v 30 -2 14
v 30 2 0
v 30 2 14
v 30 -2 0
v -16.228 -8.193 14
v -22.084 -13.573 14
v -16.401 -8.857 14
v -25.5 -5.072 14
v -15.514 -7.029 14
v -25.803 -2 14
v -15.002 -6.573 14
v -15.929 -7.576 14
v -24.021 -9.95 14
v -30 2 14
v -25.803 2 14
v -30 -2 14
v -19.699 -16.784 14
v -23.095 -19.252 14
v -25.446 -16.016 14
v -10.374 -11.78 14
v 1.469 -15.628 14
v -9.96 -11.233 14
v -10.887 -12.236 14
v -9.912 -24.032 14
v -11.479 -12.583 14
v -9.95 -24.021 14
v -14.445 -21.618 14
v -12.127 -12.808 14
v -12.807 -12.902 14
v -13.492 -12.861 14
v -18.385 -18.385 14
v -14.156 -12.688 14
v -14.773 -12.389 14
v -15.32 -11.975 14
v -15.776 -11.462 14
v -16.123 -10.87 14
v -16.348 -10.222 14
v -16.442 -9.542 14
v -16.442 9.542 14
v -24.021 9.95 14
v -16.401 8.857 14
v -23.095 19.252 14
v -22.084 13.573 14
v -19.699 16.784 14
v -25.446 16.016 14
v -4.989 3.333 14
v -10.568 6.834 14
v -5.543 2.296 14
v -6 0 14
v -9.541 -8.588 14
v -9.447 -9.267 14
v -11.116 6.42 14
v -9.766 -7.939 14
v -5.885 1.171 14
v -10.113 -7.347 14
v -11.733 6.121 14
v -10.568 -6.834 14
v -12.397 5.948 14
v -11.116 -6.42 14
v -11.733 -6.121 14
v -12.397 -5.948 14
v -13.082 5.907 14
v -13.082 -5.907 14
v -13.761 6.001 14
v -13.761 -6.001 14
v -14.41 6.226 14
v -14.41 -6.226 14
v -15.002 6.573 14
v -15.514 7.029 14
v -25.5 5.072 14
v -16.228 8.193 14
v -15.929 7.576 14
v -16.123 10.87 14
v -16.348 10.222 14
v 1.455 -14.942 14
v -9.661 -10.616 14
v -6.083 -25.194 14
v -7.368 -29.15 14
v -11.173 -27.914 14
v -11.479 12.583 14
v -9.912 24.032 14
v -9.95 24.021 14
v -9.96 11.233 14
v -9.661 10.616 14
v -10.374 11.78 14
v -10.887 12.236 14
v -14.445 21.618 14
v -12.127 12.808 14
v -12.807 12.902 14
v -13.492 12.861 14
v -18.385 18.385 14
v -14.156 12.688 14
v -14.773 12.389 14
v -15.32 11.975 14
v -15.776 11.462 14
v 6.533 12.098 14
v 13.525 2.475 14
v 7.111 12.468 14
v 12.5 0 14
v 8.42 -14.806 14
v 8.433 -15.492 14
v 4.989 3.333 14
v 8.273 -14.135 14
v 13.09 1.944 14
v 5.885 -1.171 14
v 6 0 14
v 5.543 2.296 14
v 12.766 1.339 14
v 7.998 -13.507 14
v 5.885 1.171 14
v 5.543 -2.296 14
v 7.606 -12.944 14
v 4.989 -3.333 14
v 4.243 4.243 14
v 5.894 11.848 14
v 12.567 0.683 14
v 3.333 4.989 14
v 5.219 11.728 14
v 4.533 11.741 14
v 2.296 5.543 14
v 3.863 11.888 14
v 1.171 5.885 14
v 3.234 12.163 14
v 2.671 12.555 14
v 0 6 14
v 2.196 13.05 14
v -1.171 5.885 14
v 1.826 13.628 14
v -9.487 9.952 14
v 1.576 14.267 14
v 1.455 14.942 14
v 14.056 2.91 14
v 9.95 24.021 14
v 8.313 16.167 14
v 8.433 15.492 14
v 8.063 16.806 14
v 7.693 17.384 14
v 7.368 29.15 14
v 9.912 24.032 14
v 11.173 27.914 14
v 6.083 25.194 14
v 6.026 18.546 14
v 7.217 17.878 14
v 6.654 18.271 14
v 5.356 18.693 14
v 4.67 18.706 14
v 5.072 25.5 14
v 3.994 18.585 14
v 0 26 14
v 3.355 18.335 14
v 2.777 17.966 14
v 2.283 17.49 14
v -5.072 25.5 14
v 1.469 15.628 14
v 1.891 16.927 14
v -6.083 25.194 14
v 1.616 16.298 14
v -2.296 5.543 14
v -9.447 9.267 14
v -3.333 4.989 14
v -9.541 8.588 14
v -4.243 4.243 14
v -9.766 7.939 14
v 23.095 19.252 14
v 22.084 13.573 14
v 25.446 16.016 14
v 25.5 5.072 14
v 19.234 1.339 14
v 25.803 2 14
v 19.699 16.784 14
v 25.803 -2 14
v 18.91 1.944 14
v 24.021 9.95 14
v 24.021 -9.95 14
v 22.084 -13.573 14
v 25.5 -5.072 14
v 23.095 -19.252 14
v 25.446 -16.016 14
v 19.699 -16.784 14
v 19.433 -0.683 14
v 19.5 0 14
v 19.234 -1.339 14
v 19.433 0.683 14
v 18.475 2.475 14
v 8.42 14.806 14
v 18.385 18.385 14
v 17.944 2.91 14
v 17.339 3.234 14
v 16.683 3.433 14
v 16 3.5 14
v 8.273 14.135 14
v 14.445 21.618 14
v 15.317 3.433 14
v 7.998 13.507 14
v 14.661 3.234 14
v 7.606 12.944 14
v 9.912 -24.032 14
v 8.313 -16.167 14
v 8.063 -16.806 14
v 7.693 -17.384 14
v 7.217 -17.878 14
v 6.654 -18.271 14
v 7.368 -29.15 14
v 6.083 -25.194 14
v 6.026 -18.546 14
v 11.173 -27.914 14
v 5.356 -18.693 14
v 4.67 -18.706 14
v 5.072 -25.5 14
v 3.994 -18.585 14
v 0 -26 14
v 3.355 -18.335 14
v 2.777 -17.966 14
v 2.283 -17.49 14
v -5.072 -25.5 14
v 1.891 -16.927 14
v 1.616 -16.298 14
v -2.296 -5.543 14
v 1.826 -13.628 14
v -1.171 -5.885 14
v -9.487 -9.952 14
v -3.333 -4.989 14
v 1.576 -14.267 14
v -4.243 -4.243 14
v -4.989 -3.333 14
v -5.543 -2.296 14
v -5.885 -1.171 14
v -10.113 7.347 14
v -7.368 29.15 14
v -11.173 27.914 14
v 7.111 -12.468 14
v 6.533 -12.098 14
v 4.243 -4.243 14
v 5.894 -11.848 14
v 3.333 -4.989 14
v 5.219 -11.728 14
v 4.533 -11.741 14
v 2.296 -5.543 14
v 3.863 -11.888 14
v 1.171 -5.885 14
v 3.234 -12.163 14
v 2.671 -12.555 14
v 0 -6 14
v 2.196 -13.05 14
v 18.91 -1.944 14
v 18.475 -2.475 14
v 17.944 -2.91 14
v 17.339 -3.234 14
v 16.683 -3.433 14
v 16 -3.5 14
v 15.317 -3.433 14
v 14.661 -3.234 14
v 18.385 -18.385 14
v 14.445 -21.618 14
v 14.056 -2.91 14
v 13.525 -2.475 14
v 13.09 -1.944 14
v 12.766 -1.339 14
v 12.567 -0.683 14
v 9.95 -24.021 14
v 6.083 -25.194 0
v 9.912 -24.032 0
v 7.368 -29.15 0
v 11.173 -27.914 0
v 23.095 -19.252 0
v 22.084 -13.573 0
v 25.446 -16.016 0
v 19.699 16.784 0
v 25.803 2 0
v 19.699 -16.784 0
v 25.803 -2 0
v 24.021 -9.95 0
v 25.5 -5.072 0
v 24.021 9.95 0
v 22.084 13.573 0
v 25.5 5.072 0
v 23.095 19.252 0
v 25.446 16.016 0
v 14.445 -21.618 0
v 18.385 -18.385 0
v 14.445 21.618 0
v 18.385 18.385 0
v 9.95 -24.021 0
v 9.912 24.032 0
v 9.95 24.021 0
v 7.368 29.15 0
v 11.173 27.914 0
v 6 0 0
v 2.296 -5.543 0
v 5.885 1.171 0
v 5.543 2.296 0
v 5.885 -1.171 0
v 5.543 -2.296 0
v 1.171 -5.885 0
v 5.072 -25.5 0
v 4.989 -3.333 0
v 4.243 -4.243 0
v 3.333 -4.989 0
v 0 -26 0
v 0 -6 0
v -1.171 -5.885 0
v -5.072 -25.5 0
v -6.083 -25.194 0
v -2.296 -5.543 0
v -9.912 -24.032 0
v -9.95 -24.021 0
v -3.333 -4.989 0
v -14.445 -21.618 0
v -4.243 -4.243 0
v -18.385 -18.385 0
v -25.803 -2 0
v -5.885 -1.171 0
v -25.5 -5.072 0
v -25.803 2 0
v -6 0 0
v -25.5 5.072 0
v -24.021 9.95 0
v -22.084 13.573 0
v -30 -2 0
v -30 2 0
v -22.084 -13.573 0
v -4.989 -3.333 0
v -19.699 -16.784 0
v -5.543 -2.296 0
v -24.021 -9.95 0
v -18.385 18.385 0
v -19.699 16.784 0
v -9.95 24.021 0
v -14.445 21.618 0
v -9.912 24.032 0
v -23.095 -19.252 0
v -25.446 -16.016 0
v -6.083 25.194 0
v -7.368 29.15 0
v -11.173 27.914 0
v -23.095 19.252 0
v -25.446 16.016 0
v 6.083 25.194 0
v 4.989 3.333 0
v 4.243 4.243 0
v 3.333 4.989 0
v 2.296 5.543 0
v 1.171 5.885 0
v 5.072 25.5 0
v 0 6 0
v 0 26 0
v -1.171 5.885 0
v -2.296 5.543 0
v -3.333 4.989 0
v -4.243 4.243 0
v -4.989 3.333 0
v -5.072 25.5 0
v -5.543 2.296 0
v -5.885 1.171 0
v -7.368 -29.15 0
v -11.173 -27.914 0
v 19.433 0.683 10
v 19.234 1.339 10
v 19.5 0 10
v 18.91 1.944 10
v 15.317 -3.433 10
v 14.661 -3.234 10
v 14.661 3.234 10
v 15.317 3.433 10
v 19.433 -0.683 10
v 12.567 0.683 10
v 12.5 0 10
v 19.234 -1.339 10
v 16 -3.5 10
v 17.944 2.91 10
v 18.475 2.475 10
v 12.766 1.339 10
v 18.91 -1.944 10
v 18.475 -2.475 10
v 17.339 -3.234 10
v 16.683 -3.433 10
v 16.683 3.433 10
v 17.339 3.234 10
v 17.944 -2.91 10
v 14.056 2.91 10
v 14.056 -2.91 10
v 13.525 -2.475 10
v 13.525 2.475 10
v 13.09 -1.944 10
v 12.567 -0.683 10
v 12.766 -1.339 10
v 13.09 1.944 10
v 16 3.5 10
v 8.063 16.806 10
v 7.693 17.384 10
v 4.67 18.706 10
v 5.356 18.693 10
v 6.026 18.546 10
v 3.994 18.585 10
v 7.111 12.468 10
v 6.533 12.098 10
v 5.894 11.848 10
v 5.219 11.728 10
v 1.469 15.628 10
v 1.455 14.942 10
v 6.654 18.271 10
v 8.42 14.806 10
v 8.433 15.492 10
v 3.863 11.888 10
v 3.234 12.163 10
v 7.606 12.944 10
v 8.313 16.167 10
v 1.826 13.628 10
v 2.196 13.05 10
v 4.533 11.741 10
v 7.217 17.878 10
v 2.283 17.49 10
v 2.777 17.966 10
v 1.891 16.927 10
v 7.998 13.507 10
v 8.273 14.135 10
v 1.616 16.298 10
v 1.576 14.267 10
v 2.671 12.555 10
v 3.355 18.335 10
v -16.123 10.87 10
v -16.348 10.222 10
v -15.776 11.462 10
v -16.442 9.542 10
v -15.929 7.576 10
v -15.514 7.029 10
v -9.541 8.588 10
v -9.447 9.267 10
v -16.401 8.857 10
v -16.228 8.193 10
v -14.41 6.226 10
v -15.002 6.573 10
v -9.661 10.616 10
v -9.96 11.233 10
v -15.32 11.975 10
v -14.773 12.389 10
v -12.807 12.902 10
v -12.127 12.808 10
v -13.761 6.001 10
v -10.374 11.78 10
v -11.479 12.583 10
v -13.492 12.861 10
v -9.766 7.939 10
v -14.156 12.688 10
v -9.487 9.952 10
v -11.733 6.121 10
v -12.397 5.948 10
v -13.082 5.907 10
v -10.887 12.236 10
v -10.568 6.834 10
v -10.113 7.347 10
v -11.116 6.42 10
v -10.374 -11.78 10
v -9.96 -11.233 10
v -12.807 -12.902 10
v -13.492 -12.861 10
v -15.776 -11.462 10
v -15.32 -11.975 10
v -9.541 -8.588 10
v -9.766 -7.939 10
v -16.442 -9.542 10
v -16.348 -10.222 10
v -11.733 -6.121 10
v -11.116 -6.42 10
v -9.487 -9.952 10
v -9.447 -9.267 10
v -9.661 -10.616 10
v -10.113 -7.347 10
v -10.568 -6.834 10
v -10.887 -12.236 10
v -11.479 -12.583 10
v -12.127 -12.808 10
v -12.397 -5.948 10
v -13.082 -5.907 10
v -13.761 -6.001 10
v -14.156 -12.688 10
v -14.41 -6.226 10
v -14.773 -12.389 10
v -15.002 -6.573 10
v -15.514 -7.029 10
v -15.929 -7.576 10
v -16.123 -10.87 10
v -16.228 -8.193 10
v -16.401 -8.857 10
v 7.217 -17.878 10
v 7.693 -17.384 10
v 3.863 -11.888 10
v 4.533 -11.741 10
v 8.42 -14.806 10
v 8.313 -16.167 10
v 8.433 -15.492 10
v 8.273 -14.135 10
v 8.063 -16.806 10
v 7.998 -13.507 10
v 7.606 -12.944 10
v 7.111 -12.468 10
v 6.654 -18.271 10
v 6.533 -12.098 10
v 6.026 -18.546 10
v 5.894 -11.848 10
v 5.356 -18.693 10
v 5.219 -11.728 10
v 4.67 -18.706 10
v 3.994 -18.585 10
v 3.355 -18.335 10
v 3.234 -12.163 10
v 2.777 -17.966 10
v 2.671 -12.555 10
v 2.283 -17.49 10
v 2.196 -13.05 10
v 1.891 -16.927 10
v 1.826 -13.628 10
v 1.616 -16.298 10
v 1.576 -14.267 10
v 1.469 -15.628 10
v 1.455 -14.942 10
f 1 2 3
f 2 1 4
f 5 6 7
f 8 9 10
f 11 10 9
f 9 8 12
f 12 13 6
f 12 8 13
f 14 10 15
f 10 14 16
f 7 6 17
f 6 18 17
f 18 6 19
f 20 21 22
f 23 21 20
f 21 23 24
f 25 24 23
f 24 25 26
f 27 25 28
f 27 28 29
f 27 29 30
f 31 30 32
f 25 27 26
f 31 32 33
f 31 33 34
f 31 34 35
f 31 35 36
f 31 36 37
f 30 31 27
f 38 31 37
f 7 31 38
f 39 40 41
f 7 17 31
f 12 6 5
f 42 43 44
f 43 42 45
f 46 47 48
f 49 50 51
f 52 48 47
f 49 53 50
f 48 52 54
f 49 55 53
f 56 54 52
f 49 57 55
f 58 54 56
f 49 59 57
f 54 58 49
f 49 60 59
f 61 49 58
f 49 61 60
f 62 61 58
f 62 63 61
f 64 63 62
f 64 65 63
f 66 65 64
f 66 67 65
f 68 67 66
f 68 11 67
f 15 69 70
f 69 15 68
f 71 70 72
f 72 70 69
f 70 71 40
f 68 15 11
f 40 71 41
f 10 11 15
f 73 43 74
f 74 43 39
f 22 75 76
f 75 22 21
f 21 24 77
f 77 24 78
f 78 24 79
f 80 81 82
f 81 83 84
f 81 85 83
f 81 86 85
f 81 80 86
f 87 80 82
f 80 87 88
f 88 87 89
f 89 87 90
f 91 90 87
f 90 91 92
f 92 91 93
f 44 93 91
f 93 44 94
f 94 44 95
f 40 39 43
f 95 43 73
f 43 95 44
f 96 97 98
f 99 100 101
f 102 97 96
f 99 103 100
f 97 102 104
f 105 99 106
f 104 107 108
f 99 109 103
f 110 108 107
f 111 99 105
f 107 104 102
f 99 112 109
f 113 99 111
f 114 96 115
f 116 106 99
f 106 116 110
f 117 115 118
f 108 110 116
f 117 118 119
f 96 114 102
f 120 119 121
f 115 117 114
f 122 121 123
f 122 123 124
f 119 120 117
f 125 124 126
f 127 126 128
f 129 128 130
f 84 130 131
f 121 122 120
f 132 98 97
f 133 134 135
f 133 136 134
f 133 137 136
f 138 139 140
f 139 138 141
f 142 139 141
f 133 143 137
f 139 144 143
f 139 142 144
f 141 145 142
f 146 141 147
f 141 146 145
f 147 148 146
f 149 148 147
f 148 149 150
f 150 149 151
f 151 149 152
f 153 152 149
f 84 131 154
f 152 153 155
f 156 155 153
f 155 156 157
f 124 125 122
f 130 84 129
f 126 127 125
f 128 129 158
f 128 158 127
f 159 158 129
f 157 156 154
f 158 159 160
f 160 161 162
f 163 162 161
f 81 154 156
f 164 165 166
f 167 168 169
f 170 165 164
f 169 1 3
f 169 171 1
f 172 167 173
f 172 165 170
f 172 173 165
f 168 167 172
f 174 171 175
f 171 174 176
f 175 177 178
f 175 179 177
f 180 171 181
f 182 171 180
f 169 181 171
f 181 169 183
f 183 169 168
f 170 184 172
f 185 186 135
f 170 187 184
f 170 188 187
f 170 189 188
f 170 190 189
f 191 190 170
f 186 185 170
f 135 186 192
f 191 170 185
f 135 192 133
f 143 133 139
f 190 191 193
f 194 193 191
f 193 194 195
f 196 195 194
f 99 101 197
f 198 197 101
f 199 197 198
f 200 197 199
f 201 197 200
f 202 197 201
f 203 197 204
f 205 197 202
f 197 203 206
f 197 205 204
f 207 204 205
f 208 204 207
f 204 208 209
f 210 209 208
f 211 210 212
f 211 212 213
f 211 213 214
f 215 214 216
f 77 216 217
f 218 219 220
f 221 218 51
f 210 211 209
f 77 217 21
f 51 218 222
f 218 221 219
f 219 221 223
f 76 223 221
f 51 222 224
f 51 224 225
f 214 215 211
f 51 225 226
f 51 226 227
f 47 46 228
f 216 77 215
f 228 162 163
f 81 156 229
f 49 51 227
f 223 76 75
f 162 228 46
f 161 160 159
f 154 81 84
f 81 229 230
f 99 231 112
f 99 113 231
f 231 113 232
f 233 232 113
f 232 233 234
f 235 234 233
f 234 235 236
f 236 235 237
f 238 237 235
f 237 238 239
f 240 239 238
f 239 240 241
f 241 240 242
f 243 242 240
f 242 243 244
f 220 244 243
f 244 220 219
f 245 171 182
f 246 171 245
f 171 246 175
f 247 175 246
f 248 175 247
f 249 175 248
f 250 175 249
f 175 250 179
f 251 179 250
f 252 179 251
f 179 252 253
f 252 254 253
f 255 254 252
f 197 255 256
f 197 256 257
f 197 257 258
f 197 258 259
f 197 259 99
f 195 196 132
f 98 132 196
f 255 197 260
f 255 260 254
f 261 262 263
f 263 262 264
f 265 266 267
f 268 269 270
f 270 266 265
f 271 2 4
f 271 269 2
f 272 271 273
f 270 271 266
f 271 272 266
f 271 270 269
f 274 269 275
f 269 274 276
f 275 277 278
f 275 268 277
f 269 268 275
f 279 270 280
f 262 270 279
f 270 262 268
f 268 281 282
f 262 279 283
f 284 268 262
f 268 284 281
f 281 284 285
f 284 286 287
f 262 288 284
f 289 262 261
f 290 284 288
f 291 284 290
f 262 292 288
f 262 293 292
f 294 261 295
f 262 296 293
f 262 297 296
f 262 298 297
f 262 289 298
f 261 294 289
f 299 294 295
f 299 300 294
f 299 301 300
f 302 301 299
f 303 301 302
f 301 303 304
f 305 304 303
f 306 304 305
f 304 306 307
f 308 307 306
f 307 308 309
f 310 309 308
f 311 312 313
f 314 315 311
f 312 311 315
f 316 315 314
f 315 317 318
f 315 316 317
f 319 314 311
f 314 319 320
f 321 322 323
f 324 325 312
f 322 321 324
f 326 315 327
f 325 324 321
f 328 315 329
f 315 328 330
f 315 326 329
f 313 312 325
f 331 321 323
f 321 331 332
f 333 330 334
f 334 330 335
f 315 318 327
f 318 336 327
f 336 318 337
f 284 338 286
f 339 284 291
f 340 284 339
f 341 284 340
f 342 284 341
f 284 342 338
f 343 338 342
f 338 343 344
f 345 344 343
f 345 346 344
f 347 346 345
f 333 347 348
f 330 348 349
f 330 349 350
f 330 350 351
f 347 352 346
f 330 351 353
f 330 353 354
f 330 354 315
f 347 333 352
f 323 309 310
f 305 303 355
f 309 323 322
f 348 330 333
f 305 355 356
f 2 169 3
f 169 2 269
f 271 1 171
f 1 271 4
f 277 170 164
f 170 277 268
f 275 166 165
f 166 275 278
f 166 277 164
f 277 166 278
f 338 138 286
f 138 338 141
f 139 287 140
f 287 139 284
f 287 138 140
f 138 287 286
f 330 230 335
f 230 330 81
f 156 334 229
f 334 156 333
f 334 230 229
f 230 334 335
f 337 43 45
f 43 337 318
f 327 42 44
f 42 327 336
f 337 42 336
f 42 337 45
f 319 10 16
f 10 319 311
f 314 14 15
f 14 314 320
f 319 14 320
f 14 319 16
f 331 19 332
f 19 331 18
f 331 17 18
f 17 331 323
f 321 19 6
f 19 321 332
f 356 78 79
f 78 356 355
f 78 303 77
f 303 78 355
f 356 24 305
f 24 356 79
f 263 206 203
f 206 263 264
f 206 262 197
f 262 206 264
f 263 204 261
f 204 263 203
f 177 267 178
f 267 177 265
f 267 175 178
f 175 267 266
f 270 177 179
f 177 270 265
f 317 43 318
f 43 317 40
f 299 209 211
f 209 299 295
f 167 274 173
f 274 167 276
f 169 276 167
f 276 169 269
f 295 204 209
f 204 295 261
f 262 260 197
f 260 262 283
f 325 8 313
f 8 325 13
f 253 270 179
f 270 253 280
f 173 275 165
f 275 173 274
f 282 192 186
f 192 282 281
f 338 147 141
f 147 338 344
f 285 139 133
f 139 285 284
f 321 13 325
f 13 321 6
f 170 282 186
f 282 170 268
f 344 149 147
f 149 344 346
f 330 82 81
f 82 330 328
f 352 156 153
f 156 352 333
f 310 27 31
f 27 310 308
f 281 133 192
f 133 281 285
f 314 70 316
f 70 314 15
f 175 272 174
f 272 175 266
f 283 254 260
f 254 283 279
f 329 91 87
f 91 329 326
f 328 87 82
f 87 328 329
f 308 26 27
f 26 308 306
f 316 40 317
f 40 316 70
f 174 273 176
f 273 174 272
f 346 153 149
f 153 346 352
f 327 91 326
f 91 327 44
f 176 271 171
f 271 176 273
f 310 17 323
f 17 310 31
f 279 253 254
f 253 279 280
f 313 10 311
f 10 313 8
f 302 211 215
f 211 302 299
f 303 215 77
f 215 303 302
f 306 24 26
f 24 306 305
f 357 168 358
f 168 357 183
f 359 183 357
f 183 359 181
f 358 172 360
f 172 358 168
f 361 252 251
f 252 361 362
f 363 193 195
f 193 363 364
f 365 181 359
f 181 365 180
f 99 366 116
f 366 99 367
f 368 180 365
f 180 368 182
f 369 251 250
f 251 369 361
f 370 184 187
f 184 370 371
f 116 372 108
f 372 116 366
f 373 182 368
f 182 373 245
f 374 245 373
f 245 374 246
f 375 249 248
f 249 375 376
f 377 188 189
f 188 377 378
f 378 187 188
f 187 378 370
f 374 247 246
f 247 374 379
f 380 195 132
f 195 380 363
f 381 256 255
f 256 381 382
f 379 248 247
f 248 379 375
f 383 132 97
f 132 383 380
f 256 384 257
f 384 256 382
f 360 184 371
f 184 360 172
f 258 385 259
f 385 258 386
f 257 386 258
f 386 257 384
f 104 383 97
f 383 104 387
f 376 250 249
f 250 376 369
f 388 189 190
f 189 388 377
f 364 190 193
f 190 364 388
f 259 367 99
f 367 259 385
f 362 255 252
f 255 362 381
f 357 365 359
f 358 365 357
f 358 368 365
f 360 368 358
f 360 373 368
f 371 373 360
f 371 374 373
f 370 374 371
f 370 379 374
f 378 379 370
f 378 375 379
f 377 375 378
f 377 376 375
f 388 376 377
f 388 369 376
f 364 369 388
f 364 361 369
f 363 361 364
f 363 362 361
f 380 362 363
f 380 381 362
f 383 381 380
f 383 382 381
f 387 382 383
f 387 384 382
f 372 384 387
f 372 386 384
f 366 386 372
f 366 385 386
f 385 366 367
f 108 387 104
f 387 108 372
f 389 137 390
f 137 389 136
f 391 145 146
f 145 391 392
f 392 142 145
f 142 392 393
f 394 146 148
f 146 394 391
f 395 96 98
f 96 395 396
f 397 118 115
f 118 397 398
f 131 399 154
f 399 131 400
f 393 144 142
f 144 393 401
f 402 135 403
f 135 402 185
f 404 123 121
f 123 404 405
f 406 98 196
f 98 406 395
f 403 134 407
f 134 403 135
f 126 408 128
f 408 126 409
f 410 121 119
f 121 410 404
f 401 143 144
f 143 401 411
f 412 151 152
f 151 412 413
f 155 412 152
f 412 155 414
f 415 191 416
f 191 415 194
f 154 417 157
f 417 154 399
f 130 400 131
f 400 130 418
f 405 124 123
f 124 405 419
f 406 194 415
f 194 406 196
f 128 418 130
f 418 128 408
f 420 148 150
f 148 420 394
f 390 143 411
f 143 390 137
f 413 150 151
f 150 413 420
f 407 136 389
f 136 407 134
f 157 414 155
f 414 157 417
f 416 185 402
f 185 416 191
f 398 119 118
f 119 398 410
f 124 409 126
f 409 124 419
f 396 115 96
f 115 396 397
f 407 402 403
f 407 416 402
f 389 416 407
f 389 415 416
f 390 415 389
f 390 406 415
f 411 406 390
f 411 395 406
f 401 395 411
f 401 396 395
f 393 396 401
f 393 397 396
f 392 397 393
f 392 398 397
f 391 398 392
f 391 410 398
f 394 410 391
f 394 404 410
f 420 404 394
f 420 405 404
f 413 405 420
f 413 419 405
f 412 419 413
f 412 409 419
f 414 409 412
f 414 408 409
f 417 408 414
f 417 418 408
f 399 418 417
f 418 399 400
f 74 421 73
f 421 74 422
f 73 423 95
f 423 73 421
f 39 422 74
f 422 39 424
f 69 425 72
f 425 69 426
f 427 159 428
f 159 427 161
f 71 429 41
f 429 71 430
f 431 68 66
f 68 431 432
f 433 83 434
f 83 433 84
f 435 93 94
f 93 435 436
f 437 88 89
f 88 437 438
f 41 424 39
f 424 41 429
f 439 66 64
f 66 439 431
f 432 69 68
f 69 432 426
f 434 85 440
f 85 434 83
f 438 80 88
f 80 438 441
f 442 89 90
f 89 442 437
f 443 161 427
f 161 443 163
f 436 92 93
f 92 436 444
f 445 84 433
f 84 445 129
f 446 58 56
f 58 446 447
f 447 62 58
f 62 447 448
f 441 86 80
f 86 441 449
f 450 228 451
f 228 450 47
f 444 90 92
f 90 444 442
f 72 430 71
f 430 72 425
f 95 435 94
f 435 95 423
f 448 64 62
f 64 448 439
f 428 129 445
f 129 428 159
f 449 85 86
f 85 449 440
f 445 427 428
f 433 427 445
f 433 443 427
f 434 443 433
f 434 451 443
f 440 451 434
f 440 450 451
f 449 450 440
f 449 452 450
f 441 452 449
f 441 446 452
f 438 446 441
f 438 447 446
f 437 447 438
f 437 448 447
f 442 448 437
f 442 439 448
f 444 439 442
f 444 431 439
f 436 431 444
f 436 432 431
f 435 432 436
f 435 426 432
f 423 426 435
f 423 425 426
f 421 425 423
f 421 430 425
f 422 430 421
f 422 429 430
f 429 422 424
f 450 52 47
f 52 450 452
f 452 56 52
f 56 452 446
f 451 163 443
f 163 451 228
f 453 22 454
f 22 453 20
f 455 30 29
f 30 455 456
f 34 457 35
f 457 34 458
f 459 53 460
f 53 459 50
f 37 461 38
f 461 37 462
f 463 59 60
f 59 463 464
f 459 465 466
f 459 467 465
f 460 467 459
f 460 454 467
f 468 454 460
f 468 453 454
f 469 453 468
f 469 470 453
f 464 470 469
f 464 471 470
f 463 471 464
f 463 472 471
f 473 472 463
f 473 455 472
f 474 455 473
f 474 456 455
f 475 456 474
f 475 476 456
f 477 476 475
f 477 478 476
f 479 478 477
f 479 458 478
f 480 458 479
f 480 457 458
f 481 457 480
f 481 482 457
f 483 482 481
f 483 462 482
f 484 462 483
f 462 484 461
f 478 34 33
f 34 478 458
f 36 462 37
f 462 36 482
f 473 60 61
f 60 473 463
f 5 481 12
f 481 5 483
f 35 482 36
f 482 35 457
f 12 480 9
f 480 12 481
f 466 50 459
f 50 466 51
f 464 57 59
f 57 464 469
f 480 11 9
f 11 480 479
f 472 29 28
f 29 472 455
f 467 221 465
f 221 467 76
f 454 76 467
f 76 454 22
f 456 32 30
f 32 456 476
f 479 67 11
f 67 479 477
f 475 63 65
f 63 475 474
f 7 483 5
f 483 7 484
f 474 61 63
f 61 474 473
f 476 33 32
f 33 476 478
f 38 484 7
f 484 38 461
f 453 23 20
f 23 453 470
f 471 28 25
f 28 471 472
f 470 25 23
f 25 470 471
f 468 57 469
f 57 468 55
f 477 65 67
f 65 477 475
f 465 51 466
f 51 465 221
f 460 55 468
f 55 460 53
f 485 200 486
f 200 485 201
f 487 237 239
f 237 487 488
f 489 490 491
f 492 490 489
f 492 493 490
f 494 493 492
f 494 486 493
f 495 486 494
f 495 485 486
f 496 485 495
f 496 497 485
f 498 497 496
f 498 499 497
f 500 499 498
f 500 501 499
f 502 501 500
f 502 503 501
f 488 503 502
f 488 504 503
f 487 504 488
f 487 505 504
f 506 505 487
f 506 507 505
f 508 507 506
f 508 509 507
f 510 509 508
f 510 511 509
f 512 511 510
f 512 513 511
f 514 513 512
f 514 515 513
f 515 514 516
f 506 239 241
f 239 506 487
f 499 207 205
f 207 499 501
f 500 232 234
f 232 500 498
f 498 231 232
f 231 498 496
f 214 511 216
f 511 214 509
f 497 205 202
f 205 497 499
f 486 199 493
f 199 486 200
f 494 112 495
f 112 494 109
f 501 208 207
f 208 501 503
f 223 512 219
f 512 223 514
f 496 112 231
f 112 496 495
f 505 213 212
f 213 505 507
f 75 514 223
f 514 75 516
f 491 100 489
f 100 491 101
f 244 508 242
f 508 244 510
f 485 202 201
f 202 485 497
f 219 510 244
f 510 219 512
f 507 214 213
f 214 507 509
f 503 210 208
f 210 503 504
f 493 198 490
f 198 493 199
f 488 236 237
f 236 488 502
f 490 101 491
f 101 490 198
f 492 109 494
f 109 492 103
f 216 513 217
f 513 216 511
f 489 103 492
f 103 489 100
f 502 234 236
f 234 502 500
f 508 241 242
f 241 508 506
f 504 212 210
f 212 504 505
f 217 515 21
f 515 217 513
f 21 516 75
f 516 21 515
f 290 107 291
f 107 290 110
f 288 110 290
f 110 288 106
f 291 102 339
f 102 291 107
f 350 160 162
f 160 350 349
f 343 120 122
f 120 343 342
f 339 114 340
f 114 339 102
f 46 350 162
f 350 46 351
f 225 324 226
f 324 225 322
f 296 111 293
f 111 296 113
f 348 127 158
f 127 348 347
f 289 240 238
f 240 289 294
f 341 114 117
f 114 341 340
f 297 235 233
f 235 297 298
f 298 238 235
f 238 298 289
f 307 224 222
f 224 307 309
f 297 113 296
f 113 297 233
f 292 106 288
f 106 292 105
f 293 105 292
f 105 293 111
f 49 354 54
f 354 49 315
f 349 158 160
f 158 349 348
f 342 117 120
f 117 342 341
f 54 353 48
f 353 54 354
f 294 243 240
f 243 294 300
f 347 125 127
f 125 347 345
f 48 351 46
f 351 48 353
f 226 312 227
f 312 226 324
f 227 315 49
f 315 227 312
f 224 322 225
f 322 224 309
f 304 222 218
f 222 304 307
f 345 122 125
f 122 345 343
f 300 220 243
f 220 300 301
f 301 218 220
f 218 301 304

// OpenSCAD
$fn = 32;

// ----------------------------------------------------------------------
// Spur blank: lightened gear blank
// ----------------------------------------------------------------------

// --- parameters (mm) ---
disc_r = 26;              // blank root radius
disc_t = 14;              // blank thickness
n_teeth = 10;             // stub tooth count
tooth_w = 4;              // tooth width at the root
tooth_h = 4;              // tooth height above the root
bore_r = 6;               // central bore radius
ring_r = 16;              // lightening pocket ring radius
pocket_r = 3.5;           // lightening pocket radius

out_r = disc_r + tooth_h;  // tip radius
bbox_x = 60.0;  // measured width over the teeth
bbox_y = 58.3;  // measured depth over the teeth

difference() {
union() {
  cylinder(r = disc_r, h = disc_t);
  for (i = [0 : n_teeth - 1])
    rotate([0, 0, i * 360 / n_teeth])
      translate([disc_r - 1, -tooth_w / 2, 0])
        cube([tooth_h + 1, tooth_w, disc_t]);
}
  translate([0, 0, -1]) cylinder(r = bore_r, h = disc_t + 2);
  for (i = [0 : 5])
    rotate([0, 0, i * 72])
      translate([ring_r, 0, disc_t - 4])
        cylinder(r = pocket_r, h = 5);
}
